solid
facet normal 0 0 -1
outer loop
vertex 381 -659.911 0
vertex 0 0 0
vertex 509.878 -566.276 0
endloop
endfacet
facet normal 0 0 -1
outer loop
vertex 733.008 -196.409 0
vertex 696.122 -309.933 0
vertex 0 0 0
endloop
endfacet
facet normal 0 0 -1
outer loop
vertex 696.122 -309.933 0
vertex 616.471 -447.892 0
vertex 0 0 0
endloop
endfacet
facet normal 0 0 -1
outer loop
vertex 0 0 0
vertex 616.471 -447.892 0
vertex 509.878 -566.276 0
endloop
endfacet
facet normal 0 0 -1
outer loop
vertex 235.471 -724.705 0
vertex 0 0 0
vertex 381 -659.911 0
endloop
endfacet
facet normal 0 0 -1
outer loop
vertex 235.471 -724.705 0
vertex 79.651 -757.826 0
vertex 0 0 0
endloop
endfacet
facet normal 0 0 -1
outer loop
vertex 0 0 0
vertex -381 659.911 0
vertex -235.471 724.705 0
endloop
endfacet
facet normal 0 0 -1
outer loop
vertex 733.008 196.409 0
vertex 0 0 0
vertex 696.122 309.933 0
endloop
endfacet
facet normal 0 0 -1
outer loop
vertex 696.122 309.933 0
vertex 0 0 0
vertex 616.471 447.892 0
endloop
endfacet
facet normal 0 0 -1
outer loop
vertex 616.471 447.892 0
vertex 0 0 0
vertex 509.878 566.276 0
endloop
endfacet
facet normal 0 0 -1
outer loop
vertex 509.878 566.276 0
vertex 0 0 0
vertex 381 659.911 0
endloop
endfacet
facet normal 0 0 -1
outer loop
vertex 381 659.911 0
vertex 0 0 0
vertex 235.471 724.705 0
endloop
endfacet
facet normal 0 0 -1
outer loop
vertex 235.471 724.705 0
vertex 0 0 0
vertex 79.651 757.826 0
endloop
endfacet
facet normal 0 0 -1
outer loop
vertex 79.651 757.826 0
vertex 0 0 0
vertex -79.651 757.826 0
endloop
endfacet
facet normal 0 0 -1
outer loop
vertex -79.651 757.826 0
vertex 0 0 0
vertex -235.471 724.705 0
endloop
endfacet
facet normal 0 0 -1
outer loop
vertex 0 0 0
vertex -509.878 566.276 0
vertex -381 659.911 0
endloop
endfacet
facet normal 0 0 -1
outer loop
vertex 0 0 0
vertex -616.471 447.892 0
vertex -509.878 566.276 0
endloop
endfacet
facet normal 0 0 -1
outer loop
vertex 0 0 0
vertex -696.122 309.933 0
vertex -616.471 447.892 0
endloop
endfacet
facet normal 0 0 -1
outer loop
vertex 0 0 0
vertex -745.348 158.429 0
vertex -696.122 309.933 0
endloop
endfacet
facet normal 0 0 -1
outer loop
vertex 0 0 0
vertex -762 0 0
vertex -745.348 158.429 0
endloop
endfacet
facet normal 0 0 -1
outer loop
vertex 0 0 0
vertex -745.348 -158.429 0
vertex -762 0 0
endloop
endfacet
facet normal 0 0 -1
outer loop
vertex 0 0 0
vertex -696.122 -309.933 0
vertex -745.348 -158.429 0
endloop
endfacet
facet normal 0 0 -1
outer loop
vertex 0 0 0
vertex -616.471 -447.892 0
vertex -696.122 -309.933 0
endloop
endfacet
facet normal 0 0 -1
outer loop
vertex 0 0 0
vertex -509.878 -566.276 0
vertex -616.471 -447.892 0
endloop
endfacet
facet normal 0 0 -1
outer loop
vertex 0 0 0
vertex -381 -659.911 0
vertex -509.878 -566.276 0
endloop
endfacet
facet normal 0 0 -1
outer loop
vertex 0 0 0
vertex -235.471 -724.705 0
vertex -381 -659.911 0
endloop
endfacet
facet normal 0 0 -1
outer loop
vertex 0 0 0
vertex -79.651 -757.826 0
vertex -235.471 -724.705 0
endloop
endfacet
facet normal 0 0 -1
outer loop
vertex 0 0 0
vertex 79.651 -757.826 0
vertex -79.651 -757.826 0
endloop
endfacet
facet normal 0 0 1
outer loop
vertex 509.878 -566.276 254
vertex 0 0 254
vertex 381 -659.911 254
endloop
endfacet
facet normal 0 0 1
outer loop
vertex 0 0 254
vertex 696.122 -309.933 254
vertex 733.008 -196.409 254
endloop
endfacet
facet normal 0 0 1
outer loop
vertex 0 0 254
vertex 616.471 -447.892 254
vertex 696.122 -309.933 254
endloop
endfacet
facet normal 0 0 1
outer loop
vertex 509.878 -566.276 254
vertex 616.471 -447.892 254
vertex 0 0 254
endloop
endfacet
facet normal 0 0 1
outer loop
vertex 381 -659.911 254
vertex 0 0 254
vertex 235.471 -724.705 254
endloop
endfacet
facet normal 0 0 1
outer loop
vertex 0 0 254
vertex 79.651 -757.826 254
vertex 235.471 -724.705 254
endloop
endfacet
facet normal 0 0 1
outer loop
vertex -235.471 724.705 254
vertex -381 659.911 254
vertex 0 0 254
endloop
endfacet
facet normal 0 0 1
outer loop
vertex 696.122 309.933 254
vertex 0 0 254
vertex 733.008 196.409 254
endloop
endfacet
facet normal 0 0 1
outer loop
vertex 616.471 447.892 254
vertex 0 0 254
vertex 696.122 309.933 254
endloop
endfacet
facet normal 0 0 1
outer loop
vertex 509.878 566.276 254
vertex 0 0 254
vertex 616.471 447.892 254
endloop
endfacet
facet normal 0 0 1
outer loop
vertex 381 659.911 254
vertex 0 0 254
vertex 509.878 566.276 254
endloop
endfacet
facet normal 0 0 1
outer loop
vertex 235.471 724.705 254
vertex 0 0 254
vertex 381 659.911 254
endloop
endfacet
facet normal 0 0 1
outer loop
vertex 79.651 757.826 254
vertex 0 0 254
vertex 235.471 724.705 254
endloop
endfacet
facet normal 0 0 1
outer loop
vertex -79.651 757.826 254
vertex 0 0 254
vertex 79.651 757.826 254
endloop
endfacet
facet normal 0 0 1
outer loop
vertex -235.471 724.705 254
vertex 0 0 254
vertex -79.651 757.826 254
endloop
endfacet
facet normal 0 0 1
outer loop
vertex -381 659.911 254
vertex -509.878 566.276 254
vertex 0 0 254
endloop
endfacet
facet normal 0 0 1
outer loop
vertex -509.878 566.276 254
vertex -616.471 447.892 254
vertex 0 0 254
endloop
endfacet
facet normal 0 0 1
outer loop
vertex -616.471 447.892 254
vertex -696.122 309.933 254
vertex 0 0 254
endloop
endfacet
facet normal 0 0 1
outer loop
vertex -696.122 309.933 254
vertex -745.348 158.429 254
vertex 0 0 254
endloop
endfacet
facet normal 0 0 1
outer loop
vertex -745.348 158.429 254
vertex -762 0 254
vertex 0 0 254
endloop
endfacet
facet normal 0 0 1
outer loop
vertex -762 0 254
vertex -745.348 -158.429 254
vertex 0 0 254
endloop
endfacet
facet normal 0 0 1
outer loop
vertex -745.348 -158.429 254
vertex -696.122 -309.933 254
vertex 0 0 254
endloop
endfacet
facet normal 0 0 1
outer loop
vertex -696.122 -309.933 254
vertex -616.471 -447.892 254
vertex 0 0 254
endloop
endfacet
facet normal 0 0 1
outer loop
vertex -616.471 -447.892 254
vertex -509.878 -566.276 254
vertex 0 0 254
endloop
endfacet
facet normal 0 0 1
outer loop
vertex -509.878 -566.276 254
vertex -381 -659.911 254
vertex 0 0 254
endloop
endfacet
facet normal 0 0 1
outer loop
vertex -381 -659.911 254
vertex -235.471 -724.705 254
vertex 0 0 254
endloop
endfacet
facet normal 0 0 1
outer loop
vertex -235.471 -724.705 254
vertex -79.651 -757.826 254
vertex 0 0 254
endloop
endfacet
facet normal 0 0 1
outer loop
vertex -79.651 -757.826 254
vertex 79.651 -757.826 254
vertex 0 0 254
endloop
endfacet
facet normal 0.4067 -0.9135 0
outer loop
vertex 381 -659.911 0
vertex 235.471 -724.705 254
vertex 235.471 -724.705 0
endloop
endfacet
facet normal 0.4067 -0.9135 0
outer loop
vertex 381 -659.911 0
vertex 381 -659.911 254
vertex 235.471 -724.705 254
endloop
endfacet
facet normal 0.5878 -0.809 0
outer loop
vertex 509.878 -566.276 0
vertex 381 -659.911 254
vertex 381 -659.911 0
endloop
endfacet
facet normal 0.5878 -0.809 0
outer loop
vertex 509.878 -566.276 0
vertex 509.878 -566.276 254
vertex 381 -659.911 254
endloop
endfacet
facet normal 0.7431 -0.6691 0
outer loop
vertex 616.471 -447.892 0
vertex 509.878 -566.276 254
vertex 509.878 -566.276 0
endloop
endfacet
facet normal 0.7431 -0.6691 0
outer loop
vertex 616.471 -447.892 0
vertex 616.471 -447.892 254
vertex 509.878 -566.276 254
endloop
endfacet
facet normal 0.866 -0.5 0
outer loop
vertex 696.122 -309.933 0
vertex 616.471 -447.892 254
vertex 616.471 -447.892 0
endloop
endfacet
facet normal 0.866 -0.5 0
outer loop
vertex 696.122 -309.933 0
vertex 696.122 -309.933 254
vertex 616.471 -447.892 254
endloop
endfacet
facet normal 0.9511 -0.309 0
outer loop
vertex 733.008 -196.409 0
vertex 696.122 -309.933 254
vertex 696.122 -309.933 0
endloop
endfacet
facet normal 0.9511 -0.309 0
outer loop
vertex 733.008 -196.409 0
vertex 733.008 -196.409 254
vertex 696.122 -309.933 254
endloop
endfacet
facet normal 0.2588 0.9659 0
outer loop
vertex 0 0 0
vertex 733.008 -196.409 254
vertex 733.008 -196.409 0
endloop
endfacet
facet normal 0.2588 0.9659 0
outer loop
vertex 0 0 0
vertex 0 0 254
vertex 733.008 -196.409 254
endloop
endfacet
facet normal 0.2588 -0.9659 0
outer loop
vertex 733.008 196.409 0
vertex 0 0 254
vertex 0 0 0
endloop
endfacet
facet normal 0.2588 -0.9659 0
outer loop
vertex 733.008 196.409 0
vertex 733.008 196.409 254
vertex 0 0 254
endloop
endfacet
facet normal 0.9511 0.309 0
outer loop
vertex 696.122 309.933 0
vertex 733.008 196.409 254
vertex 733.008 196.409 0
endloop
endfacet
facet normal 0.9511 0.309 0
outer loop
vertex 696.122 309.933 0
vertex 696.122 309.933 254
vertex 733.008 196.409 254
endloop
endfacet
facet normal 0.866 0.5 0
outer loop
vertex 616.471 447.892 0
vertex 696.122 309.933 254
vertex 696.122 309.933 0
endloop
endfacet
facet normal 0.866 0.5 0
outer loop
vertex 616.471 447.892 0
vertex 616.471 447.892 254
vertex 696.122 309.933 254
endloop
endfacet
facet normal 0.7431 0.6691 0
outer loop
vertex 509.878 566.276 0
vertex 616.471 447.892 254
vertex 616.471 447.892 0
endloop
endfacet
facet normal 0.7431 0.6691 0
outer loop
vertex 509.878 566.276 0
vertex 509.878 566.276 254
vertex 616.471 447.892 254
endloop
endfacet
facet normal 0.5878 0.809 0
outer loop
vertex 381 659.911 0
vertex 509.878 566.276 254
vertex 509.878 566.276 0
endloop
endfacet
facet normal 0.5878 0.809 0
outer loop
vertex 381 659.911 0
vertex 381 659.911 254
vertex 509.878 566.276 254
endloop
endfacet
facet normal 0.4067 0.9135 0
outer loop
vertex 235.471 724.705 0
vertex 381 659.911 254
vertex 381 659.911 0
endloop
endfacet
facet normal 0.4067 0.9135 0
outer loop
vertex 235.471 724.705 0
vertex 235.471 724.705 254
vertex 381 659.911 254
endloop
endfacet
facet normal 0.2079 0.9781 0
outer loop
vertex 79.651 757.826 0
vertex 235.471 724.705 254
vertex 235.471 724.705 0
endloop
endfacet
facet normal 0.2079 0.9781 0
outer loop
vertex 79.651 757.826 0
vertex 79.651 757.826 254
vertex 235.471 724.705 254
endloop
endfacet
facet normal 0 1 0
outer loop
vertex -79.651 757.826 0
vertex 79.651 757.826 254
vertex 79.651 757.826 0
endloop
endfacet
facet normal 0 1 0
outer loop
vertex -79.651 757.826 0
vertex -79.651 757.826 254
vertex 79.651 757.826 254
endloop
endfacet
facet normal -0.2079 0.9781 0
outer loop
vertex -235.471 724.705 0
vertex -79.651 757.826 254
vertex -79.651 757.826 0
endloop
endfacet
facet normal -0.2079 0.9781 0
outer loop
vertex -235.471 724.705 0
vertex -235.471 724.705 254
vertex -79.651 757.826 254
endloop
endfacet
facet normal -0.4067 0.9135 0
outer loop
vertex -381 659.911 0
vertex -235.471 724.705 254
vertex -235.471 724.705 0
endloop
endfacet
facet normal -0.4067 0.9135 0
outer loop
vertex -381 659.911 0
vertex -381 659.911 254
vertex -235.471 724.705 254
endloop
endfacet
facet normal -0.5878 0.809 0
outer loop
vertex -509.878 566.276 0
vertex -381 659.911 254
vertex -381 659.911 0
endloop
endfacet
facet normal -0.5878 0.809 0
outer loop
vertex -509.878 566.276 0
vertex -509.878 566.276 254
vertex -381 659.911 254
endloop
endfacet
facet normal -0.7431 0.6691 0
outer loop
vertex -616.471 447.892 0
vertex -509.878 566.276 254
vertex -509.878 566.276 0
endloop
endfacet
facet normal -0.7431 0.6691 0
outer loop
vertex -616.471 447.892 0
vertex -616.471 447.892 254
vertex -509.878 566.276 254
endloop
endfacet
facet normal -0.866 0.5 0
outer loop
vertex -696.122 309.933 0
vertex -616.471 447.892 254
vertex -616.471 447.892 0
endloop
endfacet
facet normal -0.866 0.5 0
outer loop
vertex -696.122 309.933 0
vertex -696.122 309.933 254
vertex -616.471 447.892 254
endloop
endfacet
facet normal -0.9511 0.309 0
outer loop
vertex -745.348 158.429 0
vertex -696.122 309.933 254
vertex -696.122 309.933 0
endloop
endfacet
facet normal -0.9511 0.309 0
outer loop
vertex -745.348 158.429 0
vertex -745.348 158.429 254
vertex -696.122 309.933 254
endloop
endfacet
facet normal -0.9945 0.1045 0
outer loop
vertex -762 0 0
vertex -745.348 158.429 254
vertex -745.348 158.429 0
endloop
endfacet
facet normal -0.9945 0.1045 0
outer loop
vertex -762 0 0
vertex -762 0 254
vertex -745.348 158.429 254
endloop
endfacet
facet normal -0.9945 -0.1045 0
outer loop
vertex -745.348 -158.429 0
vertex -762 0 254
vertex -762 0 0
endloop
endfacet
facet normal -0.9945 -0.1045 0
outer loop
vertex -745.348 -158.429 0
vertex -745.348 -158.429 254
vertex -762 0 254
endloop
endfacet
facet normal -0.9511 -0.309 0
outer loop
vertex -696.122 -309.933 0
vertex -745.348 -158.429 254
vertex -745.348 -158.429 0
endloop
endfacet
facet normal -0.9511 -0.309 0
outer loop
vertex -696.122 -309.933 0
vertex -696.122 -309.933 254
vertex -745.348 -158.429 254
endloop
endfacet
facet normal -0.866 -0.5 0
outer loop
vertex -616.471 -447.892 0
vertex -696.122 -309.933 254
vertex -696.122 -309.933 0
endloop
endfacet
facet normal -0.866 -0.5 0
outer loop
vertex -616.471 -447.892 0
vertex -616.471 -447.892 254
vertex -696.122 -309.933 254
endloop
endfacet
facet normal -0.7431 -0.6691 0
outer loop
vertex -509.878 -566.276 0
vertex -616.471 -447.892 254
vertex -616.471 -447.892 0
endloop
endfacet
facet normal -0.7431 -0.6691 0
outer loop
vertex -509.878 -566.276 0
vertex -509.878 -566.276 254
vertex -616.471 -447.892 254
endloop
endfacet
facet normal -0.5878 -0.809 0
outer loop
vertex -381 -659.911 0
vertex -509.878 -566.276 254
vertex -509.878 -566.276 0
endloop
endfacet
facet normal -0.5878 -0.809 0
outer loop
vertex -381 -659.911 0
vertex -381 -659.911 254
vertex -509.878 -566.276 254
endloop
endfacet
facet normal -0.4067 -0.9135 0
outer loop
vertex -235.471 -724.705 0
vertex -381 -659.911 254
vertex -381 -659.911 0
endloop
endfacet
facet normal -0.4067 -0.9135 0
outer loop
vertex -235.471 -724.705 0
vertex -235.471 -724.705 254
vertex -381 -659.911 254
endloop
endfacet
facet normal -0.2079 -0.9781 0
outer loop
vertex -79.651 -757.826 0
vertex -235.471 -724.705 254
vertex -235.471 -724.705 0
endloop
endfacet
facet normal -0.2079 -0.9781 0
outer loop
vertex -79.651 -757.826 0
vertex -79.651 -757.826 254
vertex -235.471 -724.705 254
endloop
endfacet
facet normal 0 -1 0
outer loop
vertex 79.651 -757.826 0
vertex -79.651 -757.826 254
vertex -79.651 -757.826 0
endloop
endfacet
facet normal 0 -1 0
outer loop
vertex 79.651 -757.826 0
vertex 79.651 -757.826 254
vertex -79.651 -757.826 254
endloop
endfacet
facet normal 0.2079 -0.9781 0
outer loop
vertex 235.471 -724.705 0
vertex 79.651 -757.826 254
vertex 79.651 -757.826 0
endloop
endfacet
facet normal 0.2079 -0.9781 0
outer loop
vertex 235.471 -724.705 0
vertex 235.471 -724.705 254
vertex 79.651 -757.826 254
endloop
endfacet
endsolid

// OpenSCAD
// Unit of length: Unit.MM
linear_extrude(height = 254.0, center = false, twist = 0.0, scale = 1.0)
{
   intersection()
   {
      circle(d = 1524.0, $fa = 12.0, $fs = 50.8, $fn = 0);
      polygon(points = [[0.0, 0.0], [849.9117, 227.7332], [0.0, 1077.6449], [-1077.6449, 0.0], [0.0, -1077.6449], [849.9117, -227.7332]], convexity = 2);
   }
}
